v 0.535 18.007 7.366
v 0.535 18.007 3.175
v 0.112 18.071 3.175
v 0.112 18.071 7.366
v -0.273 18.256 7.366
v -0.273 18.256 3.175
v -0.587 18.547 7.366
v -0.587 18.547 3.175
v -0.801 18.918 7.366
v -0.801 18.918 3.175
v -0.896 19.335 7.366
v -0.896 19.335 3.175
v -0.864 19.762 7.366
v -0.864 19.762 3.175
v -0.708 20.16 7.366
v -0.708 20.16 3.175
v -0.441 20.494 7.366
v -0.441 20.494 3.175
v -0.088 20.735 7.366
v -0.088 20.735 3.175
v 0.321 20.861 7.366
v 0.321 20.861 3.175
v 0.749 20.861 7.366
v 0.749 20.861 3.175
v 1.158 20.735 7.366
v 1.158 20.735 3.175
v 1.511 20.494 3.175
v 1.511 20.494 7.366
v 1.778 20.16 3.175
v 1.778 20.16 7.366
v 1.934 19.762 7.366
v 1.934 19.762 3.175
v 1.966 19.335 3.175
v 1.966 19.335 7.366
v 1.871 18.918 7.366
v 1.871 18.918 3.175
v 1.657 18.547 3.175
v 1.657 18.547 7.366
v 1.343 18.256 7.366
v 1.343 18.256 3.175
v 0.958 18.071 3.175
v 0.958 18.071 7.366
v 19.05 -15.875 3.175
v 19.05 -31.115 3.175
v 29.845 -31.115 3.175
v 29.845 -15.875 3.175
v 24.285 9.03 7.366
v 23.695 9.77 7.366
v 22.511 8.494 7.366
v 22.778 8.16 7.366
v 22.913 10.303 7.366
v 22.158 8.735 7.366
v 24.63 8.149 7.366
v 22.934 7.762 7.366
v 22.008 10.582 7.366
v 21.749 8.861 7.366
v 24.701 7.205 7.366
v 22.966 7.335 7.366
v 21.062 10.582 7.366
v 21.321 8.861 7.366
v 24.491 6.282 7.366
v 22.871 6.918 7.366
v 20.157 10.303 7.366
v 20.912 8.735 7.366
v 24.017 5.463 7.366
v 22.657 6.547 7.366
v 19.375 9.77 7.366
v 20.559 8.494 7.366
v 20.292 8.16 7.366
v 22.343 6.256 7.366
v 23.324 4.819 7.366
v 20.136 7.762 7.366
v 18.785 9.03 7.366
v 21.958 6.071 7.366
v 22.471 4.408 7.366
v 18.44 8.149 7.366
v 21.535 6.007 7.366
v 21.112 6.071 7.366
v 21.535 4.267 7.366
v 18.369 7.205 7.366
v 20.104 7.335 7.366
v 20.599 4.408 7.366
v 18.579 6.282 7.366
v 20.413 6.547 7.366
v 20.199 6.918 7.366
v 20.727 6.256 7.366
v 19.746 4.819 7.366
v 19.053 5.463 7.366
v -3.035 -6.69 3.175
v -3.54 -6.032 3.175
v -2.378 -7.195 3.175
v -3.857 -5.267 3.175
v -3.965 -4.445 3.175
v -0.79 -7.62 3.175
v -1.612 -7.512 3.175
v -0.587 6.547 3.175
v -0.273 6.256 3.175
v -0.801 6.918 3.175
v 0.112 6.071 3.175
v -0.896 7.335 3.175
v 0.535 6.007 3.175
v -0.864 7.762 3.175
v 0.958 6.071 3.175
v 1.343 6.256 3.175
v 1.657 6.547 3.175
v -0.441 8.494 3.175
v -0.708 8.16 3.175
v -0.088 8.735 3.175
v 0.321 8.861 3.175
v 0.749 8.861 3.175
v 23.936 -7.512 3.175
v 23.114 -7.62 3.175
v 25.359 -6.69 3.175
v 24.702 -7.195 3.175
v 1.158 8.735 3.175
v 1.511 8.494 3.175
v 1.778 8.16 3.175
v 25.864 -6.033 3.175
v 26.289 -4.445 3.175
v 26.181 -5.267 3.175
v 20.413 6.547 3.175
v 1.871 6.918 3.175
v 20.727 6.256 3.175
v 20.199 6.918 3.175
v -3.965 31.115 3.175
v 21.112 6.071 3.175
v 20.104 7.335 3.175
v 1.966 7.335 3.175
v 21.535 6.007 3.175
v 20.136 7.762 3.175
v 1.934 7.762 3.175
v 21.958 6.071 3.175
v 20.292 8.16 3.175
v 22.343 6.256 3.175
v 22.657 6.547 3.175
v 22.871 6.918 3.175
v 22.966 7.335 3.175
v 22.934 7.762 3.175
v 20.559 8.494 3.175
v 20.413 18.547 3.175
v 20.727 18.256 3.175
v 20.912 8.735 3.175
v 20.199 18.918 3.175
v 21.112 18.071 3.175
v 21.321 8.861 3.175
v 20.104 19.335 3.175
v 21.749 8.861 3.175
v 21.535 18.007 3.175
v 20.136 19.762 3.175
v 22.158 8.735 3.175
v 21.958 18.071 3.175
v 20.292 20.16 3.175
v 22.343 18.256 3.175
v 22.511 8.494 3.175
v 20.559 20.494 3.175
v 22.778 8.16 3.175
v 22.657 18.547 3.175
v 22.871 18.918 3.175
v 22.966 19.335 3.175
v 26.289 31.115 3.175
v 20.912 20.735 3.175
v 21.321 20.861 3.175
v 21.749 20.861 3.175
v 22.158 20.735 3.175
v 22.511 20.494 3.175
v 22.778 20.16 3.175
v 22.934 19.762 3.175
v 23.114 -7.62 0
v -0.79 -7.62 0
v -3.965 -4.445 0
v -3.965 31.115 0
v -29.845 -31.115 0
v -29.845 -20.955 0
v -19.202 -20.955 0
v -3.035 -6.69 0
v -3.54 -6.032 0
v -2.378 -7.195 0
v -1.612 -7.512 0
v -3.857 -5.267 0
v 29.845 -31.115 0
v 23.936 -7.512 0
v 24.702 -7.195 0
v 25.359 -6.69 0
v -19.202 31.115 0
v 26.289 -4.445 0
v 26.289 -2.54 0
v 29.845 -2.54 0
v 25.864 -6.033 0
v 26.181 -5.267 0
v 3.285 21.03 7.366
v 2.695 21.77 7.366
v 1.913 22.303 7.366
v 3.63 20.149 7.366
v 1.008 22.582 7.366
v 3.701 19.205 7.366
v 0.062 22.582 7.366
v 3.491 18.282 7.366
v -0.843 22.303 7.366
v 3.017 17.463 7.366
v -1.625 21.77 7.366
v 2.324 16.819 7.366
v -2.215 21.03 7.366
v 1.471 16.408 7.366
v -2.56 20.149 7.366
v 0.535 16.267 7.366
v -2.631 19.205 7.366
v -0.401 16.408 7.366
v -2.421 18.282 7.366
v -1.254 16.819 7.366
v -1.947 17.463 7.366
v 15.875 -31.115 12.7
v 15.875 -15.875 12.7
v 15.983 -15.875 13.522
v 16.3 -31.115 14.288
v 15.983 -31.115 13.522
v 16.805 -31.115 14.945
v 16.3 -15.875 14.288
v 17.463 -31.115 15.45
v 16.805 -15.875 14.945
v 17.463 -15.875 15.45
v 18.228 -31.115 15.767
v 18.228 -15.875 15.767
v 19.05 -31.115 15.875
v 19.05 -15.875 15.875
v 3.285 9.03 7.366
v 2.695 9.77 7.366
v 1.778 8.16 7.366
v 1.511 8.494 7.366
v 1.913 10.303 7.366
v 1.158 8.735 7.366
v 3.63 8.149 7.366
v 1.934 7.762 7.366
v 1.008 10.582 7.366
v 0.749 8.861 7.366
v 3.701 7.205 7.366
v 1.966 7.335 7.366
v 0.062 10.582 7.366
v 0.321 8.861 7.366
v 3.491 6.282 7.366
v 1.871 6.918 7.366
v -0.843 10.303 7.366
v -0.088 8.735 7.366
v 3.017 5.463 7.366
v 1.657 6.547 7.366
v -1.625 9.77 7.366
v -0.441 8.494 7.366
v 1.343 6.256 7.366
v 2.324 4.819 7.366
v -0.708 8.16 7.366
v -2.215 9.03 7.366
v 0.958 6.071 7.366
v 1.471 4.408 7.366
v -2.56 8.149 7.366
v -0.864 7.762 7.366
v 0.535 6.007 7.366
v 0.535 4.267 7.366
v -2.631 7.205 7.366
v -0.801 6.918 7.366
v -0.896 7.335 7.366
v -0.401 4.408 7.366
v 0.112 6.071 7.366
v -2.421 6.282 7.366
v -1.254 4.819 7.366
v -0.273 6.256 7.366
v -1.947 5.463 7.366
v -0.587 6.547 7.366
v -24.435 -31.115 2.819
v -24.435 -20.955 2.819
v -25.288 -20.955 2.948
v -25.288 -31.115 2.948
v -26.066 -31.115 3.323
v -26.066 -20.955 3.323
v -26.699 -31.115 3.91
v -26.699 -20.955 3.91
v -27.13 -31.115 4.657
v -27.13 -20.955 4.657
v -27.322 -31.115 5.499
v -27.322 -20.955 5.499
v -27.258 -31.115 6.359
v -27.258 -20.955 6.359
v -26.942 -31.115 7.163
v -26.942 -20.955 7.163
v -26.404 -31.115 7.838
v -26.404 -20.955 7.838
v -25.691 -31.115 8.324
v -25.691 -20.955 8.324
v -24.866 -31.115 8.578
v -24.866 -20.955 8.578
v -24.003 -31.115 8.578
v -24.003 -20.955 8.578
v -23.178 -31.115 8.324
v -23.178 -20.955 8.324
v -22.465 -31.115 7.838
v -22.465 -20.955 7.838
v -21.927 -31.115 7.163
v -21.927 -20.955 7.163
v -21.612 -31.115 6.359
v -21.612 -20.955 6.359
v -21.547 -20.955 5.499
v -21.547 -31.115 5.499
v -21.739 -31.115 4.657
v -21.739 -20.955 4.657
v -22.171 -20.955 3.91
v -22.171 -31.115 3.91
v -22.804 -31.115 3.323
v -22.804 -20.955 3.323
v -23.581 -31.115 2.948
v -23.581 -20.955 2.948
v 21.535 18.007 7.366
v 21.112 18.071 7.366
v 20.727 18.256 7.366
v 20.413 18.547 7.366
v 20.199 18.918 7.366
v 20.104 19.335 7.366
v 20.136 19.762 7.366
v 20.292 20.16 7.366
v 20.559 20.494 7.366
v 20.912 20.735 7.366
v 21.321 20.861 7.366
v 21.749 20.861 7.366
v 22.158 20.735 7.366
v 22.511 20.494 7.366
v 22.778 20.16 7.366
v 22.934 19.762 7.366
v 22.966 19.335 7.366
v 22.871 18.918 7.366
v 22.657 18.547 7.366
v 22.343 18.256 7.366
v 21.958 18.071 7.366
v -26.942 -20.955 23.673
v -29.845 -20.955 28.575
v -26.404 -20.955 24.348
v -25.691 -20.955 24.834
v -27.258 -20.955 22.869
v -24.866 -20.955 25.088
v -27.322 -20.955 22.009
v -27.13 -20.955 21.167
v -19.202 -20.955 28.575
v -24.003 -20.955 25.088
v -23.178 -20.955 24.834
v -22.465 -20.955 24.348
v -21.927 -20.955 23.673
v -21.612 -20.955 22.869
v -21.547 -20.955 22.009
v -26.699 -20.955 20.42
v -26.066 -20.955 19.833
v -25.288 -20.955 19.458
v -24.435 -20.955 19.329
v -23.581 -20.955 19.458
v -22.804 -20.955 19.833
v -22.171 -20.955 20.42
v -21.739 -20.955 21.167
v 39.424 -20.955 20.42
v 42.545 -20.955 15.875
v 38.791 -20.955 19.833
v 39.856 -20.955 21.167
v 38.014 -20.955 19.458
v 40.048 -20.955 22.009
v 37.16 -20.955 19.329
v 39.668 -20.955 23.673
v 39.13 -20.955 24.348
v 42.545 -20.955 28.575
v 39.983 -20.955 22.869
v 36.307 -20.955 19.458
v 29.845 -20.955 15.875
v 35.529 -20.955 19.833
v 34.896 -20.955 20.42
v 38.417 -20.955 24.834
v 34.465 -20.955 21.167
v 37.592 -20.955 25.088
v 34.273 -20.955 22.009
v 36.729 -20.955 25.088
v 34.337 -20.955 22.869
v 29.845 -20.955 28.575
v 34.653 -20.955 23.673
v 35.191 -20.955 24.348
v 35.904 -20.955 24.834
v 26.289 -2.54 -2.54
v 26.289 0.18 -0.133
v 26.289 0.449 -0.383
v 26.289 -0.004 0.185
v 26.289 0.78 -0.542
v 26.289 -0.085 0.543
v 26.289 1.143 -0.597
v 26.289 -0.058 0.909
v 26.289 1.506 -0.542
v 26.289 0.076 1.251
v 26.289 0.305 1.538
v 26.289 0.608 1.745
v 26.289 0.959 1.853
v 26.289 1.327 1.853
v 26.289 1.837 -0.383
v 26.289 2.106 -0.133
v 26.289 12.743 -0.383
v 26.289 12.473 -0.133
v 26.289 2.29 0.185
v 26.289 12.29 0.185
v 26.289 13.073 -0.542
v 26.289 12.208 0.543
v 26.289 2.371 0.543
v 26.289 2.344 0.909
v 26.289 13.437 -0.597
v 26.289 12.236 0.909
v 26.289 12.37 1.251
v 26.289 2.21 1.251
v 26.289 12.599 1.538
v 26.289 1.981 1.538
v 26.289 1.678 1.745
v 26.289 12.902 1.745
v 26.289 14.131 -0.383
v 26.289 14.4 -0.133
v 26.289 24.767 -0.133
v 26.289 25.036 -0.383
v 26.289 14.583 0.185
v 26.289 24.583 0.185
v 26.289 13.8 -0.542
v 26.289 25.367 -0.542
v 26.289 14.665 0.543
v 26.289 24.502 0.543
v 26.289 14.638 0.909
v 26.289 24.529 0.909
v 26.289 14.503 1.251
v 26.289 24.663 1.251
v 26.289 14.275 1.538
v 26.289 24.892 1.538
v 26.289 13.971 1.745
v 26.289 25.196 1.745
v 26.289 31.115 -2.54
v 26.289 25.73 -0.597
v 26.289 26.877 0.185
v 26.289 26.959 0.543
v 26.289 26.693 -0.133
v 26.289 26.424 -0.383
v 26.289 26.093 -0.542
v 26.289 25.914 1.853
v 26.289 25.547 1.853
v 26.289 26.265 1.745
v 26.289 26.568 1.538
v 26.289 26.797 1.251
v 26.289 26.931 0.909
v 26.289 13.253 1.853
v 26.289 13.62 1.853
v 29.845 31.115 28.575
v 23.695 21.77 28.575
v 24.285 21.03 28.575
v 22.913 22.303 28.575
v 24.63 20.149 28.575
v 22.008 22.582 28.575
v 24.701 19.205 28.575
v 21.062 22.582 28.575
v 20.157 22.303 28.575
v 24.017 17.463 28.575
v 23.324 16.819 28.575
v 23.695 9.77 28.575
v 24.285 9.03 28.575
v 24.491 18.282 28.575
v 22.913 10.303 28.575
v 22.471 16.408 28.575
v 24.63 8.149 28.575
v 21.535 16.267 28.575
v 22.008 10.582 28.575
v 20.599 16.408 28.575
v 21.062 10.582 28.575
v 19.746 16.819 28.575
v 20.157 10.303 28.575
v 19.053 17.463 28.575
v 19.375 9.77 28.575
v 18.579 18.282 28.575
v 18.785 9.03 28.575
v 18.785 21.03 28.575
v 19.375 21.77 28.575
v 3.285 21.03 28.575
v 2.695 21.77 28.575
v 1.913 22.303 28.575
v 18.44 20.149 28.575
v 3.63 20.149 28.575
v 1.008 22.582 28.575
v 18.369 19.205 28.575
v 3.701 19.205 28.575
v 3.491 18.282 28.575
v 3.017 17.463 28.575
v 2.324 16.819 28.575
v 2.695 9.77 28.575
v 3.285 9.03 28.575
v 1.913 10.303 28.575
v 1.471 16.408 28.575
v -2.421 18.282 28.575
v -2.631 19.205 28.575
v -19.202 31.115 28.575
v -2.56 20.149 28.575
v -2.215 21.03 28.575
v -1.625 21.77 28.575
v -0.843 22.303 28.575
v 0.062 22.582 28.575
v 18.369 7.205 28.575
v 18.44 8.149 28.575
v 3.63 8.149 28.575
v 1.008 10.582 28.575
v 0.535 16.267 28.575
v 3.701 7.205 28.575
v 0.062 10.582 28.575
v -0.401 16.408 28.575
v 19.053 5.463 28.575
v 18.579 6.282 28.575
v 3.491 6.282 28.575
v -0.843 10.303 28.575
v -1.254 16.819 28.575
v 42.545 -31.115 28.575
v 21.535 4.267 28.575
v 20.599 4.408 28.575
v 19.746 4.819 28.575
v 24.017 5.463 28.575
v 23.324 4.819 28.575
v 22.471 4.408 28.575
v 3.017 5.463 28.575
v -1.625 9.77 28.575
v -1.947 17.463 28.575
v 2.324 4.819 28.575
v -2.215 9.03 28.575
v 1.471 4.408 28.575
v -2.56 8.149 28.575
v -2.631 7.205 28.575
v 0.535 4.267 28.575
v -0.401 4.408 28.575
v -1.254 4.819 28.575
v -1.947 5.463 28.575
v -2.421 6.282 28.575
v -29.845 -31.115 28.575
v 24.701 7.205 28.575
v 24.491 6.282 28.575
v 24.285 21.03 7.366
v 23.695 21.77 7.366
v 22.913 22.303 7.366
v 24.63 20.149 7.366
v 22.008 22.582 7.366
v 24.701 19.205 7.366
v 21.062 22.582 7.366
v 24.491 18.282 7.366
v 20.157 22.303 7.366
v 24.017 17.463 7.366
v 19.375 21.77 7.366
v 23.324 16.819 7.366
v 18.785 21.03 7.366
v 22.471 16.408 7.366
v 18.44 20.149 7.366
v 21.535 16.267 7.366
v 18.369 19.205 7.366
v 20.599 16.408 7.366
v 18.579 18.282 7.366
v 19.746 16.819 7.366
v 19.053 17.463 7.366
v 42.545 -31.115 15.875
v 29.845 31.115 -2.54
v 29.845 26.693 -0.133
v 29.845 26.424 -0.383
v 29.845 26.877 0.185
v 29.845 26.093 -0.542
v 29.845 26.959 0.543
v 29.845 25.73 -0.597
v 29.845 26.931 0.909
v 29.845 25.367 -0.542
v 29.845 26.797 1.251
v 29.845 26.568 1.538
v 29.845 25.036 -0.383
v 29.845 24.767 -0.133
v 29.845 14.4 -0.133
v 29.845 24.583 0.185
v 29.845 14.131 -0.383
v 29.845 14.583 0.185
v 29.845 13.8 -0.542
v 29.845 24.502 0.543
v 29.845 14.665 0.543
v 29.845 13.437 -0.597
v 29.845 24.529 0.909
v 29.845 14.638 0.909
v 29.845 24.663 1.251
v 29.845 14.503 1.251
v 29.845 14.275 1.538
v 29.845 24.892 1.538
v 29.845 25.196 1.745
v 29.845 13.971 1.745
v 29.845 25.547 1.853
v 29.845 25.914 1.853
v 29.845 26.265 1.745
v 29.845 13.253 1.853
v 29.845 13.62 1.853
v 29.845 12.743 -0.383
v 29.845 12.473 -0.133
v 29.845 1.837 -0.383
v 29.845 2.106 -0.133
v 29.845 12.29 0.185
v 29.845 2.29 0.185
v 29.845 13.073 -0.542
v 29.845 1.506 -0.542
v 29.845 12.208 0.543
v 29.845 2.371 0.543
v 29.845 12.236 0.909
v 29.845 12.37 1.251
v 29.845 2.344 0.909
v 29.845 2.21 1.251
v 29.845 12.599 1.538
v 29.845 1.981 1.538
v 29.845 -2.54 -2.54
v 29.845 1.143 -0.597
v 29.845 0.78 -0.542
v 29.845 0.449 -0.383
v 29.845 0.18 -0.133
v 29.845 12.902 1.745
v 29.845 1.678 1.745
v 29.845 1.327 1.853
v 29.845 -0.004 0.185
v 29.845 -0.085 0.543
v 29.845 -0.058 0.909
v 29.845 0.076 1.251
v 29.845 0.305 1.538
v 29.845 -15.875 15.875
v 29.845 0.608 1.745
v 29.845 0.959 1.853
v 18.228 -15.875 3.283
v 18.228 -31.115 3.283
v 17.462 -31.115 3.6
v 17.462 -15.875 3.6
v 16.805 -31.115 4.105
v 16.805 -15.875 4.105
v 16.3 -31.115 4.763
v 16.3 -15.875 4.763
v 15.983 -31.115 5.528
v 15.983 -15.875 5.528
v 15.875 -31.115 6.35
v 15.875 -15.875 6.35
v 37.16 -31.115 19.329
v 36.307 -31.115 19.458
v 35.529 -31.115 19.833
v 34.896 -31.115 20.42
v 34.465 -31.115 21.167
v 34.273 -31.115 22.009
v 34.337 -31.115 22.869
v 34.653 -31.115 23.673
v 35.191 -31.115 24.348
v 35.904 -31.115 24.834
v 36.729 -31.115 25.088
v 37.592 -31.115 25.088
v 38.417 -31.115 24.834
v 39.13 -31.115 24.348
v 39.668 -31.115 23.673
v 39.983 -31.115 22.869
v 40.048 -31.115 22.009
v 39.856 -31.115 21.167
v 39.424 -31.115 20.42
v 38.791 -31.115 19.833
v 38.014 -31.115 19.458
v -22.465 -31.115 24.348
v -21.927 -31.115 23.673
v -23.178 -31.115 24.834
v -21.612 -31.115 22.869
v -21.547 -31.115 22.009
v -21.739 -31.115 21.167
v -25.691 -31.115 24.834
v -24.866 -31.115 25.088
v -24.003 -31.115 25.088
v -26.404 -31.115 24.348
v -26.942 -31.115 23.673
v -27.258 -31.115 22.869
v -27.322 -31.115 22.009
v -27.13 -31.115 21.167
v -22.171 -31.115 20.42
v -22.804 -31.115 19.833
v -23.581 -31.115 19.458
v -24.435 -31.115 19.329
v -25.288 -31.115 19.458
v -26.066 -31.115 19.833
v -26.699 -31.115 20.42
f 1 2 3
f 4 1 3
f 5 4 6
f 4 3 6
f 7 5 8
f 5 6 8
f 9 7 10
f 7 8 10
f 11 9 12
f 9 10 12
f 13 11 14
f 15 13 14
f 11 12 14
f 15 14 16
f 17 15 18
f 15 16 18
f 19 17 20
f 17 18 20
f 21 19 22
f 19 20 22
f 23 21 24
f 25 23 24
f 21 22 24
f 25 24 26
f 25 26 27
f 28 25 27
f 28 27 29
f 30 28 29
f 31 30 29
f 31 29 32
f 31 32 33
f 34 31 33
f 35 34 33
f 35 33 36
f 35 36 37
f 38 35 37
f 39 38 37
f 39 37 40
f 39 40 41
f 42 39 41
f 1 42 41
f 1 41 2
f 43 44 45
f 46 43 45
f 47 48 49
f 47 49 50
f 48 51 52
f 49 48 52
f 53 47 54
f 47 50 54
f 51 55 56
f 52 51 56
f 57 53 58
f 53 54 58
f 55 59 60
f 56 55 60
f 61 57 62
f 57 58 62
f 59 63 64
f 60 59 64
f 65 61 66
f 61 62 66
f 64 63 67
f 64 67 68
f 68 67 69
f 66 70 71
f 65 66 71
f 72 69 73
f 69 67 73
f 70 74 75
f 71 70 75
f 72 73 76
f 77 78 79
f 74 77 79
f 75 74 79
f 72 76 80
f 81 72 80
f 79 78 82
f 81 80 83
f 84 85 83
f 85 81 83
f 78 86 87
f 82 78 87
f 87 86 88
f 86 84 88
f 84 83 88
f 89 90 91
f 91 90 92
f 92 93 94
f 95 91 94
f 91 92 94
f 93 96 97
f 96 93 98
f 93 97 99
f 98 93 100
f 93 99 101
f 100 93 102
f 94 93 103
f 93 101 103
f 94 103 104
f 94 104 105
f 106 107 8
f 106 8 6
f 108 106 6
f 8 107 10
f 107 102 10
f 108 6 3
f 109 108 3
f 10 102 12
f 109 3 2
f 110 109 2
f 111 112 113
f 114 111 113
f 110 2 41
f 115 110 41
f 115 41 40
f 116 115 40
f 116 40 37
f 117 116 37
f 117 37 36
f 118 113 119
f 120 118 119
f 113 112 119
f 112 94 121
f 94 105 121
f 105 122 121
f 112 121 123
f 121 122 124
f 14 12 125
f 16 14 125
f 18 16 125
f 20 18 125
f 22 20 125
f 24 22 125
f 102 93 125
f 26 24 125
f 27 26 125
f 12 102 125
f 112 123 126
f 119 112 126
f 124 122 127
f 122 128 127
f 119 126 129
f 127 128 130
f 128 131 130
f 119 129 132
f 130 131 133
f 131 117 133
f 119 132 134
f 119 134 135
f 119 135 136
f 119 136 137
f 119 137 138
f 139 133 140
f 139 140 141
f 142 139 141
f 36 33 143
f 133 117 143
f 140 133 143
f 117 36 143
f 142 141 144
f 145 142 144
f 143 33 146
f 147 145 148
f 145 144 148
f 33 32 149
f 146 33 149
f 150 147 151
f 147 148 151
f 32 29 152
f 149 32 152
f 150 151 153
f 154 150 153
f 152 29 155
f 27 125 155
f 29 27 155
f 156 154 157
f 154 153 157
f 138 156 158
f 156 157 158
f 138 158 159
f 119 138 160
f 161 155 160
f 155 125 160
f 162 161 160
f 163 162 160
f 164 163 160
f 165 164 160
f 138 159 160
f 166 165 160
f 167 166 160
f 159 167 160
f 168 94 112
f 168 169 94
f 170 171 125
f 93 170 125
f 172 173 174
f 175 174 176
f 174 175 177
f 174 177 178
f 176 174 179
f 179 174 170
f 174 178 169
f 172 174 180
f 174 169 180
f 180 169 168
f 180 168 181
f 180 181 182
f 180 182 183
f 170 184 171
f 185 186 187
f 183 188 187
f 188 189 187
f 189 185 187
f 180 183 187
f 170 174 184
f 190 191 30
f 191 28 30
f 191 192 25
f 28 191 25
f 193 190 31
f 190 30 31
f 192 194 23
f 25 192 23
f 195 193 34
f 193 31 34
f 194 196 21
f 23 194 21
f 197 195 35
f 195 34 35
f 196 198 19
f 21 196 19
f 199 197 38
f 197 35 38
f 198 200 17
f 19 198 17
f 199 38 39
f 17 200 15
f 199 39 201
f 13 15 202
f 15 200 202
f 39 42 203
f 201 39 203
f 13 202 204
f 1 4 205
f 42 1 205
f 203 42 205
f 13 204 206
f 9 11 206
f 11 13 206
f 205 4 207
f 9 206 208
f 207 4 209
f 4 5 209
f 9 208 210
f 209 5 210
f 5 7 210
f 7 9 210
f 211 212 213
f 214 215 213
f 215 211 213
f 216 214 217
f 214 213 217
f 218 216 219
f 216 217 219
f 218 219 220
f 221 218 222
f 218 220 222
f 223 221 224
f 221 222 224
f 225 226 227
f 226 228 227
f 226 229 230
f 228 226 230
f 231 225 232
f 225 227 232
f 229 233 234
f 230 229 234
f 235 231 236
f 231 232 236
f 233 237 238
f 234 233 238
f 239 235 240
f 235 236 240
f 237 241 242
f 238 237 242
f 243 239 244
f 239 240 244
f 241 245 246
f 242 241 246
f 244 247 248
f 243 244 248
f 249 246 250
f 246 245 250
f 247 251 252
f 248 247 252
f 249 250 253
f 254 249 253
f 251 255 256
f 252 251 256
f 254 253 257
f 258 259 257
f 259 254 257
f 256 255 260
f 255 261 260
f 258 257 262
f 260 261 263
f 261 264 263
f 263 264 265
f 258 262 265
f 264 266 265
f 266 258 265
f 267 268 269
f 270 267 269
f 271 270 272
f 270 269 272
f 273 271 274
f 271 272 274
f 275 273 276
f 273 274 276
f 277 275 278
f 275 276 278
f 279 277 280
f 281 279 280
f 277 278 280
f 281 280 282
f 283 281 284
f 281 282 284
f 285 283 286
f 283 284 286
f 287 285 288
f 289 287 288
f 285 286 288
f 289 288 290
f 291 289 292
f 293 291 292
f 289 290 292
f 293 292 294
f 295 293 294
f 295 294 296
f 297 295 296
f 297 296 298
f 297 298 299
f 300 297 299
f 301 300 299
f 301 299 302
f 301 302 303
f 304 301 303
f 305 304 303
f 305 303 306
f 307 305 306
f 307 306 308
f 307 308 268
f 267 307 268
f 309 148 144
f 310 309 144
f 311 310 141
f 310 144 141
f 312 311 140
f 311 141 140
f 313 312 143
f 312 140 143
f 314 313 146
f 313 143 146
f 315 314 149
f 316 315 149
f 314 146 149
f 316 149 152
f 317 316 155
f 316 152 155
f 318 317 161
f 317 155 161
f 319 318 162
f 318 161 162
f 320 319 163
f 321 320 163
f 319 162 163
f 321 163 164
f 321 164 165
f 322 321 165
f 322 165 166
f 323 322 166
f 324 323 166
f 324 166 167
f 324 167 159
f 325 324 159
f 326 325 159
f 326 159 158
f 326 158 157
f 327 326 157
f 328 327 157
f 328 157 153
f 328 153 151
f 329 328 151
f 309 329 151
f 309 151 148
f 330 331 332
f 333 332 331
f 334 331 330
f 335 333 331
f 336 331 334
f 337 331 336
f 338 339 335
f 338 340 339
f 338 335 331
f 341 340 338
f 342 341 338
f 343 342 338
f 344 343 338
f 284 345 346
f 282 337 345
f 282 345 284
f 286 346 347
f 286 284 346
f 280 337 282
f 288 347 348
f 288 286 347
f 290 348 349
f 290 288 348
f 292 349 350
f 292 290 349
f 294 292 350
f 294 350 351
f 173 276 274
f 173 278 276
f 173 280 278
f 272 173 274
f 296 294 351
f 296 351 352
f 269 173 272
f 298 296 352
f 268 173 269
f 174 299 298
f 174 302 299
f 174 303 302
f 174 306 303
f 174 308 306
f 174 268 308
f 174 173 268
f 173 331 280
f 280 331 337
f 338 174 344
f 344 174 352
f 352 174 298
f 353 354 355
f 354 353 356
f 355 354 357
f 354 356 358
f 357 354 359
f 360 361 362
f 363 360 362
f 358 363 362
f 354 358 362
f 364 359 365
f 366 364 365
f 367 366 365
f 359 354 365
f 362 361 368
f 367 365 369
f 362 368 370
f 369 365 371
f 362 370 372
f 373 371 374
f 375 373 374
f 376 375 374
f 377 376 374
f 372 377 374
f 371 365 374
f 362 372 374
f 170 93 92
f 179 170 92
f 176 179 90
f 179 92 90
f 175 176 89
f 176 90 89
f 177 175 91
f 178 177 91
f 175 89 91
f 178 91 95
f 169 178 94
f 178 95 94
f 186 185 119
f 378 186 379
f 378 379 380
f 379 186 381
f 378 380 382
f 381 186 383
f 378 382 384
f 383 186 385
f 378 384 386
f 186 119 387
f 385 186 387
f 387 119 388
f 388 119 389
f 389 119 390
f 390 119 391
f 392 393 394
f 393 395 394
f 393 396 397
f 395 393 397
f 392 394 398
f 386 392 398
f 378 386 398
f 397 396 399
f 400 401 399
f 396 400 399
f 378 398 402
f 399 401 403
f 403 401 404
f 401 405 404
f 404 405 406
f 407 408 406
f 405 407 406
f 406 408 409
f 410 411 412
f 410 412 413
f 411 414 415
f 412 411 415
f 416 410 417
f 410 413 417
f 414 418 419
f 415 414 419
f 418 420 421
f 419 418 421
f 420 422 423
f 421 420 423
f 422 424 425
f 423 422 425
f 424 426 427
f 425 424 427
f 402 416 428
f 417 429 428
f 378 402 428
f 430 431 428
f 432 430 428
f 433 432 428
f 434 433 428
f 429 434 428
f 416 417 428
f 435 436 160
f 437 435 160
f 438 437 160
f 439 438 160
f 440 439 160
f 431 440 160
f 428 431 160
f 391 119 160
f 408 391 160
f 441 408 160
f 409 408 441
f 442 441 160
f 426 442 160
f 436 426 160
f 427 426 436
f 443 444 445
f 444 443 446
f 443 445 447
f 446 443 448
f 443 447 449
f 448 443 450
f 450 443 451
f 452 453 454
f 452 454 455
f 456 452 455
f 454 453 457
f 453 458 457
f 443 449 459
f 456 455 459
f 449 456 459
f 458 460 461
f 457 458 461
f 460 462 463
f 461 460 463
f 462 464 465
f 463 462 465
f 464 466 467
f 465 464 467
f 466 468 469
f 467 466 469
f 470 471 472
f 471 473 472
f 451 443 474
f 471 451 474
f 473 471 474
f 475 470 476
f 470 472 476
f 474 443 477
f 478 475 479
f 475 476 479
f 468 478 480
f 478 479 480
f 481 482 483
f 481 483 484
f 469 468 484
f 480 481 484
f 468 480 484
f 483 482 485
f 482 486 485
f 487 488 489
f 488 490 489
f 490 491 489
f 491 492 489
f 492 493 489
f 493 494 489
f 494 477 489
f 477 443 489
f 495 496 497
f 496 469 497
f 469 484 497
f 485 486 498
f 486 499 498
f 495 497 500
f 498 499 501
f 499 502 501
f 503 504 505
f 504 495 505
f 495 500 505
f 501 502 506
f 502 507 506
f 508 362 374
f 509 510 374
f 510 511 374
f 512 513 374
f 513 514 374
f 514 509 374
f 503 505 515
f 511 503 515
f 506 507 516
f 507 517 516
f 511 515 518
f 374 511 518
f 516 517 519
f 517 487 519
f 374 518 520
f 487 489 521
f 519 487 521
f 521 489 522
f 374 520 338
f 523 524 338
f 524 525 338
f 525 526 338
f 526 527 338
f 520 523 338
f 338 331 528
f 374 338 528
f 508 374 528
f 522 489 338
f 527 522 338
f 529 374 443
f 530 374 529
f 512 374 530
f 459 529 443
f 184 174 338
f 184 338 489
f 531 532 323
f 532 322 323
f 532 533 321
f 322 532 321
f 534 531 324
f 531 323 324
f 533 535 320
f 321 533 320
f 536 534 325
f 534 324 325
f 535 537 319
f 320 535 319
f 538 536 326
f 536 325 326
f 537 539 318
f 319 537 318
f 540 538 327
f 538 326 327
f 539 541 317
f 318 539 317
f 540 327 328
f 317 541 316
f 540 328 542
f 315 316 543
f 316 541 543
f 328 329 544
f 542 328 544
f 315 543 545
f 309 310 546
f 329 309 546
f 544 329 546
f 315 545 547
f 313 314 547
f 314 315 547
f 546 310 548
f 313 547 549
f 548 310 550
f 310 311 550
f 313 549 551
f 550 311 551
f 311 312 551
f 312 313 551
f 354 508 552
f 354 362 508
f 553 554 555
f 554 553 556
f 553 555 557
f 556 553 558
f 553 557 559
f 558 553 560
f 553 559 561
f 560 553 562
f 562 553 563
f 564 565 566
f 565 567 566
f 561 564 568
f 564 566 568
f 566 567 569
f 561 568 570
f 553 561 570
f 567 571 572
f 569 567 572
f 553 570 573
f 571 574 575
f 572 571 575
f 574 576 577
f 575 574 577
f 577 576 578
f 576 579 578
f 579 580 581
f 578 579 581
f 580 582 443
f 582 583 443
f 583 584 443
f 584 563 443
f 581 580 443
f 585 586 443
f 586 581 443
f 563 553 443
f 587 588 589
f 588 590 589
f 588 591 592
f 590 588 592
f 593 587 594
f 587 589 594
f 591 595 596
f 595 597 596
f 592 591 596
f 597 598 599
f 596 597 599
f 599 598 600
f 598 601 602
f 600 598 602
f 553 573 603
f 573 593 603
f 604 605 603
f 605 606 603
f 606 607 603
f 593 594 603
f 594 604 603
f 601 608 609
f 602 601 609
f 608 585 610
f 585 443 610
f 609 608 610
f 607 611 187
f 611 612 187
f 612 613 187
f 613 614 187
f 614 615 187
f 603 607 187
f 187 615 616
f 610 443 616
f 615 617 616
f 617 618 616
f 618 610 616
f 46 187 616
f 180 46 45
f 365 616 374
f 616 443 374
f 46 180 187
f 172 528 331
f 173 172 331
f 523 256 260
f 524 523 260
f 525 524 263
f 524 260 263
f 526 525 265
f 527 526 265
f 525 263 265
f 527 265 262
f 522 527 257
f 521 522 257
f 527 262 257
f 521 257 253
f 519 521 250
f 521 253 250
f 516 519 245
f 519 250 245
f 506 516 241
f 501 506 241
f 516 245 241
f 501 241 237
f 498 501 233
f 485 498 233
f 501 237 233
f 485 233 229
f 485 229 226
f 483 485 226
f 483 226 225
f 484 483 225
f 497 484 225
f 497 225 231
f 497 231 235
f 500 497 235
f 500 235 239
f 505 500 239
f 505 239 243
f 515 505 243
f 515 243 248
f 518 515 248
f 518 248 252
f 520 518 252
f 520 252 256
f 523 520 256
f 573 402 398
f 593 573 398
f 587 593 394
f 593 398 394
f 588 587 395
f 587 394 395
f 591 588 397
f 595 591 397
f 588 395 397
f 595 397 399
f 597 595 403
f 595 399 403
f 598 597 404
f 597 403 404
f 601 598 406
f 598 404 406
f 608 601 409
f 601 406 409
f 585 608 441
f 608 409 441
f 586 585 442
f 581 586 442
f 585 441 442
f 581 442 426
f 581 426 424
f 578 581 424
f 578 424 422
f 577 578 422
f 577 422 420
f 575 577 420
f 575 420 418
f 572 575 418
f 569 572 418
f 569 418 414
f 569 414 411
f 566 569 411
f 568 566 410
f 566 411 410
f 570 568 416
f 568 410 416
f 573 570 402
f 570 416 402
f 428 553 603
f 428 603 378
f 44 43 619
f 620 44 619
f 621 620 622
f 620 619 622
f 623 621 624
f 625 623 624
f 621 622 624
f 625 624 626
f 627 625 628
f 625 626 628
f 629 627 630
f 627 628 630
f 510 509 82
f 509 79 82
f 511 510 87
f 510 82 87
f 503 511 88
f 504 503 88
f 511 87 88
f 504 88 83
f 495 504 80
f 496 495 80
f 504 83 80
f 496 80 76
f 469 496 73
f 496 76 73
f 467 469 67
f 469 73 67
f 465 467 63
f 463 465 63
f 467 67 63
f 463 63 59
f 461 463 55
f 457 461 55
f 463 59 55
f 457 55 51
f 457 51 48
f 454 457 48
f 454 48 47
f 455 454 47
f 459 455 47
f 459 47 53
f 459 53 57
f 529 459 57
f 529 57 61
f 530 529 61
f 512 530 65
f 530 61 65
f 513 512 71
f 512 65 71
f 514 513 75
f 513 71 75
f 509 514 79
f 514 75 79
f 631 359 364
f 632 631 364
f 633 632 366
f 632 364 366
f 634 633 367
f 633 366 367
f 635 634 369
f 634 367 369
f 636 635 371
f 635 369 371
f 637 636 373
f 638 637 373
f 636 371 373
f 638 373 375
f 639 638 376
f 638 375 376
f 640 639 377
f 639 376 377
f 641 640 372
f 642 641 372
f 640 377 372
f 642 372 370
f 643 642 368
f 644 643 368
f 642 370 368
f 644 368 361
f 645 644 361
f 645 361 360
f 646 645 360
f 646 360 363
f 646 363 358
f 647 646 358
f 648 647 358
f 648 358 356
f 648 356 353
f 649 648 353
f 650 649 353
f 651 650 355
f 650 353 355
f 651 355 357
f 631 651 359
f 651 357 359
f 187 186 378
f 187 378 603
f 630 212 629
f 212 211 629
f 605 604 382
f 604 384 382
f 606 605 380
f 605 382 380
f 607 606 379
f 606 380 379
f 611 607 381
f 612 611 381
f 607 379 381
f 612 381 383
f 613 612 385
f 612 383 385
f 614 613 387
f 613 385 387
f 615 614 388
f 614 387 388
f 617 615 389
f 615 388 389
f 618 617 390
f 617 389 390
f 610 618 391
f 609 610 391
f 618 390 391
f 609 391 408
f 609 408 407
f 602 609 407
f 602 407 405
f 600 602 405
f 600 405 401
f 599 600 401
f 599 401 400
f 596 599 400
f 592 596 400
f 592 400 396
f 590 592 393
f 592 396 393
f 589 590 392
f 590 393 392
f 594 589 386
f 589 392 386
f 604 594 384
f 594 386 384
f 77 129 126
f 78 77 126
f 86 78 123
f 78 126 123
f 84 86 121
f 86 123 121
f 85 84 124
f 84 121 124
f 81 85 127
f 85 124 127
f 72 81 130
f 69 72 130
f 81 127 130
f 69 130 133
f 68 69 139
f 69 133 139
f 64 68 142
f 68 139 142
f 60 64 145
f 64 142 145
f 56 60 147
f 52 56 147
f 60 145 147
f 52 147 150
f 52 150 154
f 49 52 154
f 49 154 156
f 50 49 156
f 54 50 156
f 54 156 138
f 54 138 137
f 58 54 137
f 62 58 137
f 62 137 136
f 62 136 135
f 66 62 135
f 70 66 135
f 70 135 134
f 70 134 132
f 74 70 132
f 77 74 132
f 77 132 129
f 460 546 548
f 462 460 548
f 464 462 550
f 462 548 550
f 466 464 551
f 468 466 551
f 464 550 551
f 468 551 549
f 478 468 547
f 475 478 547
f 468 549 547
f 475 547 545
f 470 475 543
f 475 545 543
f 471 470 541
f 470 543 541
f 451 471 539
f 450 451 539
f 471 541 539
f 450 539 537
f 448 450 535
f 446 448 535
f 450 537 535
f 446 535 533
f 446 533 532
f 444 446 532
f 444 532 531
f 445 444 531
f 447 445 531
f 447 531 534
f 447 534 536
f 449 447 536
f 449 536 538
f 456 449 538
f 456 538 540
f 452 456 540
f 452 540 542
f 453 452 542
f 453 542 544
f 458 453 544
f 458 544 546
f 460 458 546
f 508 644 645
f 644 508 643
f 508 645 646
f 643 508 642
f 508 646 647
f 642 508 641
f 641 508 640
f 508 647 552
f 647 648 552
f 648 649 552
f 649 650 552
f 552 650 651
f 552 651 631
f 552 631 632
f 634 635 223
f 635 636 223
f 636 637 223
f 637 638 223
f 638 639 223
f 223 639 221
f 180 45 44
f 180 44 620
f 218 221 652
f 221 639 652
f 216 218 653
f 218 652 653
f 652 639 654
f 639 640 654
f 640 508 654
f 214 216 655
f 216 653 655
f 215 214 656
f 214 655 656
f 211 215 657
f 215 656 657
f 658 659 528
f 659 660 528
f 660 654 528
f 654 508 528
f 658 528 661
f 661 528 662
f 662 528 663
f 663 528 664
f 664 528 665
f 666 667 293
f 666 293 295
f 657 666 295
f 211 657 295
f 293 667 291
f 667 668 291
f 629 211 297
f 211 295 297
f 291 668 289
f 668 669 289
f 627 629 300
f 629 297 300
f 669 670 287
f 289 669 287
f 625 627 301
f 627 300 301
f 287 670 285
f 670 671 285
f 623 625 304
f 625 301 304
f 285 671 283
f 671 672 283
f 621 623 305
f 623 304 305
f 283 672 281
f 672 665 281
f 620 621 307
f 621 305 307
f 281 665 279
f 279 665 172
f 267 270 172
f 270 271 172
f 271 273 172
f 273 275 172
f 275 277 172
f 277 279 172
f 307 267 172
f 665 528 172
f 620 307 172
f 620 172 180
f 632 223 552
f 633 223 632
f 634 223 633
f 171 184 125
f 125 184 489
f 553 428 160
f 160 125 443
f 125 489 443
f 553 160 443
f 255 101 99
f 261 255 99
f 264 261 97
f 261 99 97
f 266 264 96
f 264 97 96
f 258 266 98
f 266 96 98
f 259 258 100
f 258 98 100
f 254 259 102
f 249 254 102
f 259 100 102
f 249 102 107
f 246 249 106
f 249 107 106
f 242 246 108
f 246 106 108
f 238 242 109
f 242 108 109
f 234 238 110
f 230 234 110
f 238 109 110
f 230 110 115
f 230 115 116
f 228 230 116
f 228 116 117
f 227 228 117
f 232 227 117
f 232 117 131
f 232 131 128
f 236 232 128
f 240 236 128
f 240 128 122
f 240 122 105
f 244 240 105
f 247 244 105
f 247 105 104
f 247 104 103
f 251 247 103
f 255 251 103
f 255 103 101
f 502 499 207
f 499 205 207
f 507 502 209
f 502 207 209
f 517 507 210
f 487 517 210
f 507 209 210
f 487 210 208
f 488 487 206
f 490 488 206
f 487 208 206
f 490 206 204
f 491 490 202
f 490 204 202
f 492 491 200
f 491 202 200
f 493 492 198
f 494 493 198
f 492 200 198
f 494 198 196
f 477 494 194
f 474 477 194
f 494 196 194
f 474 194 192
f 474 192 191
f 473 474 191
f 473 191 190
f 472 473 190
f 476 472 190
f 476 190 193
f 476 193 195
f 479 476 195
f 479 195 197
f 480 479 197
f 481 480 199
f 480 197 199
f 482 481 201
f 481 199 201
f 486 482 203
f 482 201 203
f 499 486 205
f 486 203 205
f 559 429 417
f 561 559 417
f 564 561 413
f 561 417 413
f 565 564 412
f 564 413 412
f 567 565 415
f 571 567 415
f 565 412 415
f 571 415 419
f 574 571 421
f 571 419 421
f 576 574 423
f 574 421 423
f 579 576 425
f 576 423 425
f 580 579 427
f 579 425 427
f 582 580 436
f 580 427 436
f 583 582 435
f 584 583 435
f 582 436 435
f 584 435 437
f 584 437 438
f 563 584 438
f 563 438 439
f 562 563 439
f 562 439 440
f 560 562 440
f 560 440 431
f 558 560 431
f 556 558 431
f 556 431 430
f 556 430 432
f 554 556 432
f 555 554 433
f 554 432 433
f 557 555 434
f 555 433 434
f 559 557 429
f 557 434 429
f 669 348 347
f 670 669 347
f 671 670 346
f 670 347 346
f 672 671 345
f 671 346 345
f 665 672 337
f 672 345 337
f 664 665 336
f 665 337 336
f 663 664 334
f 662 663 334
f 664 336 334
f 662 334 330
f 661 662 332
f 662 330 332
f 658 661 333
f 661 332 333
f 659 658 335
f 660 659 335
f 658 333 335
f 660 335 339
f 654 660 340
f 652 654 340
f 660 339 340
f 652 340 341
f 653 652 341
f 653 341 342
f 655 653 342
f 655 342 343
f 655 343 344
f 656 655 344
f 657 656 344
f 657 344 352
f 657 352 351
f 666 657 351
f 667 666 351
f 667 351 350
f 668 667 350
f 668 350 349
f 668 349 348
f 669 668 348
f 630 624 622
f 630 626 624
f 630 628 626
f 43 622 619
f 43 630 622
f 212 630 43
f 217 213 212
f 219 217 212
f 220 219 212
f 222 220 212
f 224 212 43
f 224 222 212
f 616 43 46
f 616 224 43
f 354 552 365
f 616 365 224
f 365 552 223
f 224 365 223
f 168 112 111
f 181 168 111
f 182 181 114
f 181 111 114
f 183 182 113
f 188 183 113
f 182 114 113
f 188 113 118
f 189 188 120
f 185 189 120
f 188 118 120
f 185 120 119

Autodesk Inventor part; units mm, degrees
ref_plane "XZ Plane" through (0, 0, 0) normal (0, 1, 0) x (-1, 0, 0)
ref_plane "XY Plane" through (0, 0, 0) normal (0, 0, 1) x (1, 0, 0)
sketch "Sketch1" plane through (0, 0, 0) normal (0, 0, 1) x (1, 0, 0)
  line L0 (29.845, -31.115) -> (-29.845, -31.115)
  line L1 (-29.845, -31.115) -> (-29.845, 31.115)
  line L2 (-29.845, 31.115) -> (29.845, 31.115)
  line L3 (29.845, 31.115) -> (29.845, -31.115)
  line L4 (29.845, -31.115) -> (-29.845, 31.115) construction
  line L5 (-29.845, -31.115) -> (29.845, 31.115) construction
  point P0 (0, 0)
  dimension "d0" = 59.69
  dimension "d1" = 62.23
extrude "Extrusion1" add sketch "Sketch1" along normal blind 28.575
sketch "Sketch2" plane through (-29.845, 31.115, 0) normal (0, 1, 0) x (1, 0, 0)
  line L0 (0, 0) -> (59.69, 0) projected
  line L1 (59.69, 0) -> (59.69, -28.575) projected
  line L2 (56.134, 0) -> (25.88, 0)
  line L3 (25.88, 0) -> (25.88, -3.175)
  line L4 (25.88, -3.175) -> (56.134, -3.175)
  line L5 (59.69, 0) -> (0, 0) projected
  line L6 (56.134, 0) -> (56.134, -3.175)
  point P0 (29.845, 0)
  dimension "d4" = 3.175
  dimension "d5" = 30.254
  dimension "d52" = 3.556
extrude "Extrusion2" cut sketch "Sketch2" against normal blind 38.735
sketch "Sketch3" plane through (0, 0, 0) normal (0, 0, 1) x (1, 0, 0)
  point P0 (0, 0)
sketch "Sketch4" plane through (0, 0, 28.575) normal (0, 0, 1) x (1, 0, 0)
  line L0 (0.535, 7.4422) -> (21.535, 7.4422) construction
  line L1 (21.535, 7.4422) -> (21.535, 19.4422) construction
  line L2 (21.535, 19.4422) -> (0.535, 19.4422) construction
  line L3 (0.535, 19.4422) -> (0.535, 7.4422) construction
  line L4 (-29.845, -31.115) -> (29.845, -31.115) projected
  line L5 (-3.965, 31.115) -> (-3.965, -7.62) projected
  point P0 (0, 0)
  dimension "d8" = 21
  dimension "d9" = 12
  dimension "d10" = 38.5572
  dimension "d11" = 4.5
hole "Hole1" at (0.535, 19.4422, 28.575) at (0.535, 7.4422, 28.575) at (21.535, 7.4422, 28.575) at (21.535, 19.4422, 28.575) direction (0, 0, -1) diameter 2.8702 end through all counterbore diameter 6.35 counterbore depth 21.209
fillet "Fillet1" radius 3.175 2 edges at (-3.965, -7.62, 1.5875) (26.289, -7.62, 1.5875)
sketch "Sketch5" plane through (29.845, -31.115, 28.575) normal (1, 0, 0) x (0, 0, -1)
  line L0 (0, 0) -> (12.7, 0)
  line L1 (12.7, 0) -> (12.7, 10.16)
  line L2 (12.7, 10.16) -> (0, 10.16)
  line L3 (0, 10.16) -> (0, 0)
  point P0 (28.575, 31.115)
  dimension "d20" = 12.7
  dimension "d21" = 10.16
extrude "Extrusion3" add sketch "Sketch5" along normal blind 12.7
sketch "Sketch6" plane through (-29.845, -31.115, 0) normal (0, -1, 0) x (1, 0, 0)
  line L0 (29.845, 34.29) -> (29.845, -5.715) projected
  line L1 (0, 28.575) -> (72.39, 28.575) projected
  line L2 (72.39, 28.575) -> (72.39, 15.875) projected
  line L3 (0, 0) -> (0, 28.575) projected
  point P0 (67.0052, 22.225)
  point P1 (5.4102, 22.225)
  point P2 (5.4102, 5.715)
  dimension "d39" = 6.35
  dimension "d40" = 37.1602
  dimension "d41" = 16.51
  dimension "d42" = 61.595
  dimension "d67" = 5.3848
  dimension "d68" = 5.4102
hole "Hole2" at (37.1602, -31.115, 22.225) at (-24.4348, -31.115, 22.225) at (-24.4348, -31.115, 5.715) direction (0, 1, 0) diameter 5.7912 depth 12.7 tip angle 118
sketch "Sketch7" plane through (0, 0, 0) normal (0, 0, 1) x (1, 0, 0)
  line L0 (29.845, -20.955) -> (42.545, -20.955) projected
  line L1 (-29.845, 31.115) -> (-29.845, -31.115) projected
  line L2 (-29.845, -31.115) -> (42.545, -31.115) projected
  line L3 (29.845, 31.115) -> (-29.845, 31.115) projected
  line L4 (-29.845, -20.955) -> (-19.2024, -20.955)
  line L5 (-19.2024, -20.955) -> (-19.2024, 31.115)
  line L6 (-19.2024, 31.115) -> (-29.845, 31.115)
  line L7 (-29.845, 31.115) -> (-29.845, -20.955)
  point P0 (0, 0)
  dimension "d35" = 10.6426
  dimension "d36" = 10.16
  dimension "d43" = 0
extrude "Extrusion4" cut sketch "Sketch7" along normal up to next
sketch "Sketch8" plane through (-29.845, -20.955, 28.575) normal (0, 1, 0) x (1, 0, 0)
  circle A0 centre (5.4102, 22.86) radius 2.8956 projected
  point P0 (29.845, 28.575)
sketch "Sketch9" plane through (-29.845, -31.115, 0) normal (0, -1, 0) x (1, 0, 0)
  line L0 (59.69, 15.875) -> (72.39, 15.875) projected
  line L1 (59.69, 0) -> (59.69, 15.875) projected
  line L2 (59.69, 0) -> (59.69, 28.575) construction
  line L3 (59.69, 15.875) -> (45.72, 15.875)
  line L4 (45.72, 15.875) -> (45.72, 3.175)
  line L5 (45.72, 3.175) -> (59.69, 3.175)
  line L6 (59.69, 3.175) -> (59.69, 15.875)
  line L7 (59.69, 0) -> (0, 0) construction
  point P0 (29.845, 0)
  point P1 (59.69, 3.175)
  dimension "d44" = 13.97
  dimension "d46" = 0
  dimension "d48" = 3.175
extrude "Extrusion5" cut sketch "Sketch9" against normal blind 15.24
fillet "Fillet2" radius 3.175 2 edges at (15.875, -23.495, 3.175) (15.875, -23.495, 15.875)
sketch "Sketch10" plane through (0, 0, 0) normal (0, 0, -1) x (-1, 0, 0)
  line L0 (-29.845, 31.115) -> (-29.845, -31.115) projected
  line L1 (-26.289, 31.115) -> (-29.845, 31.115) projected
  line L2 (-26.289, -4.445) -> (-26.289, 31.115) projected
  line L3 (-29.845, 31.115) -> (-26.289, 31.115)
  line L4 (-26.289, 31.115) -> (-26.289, -2.54)
  line L5 (-26.289, -2.54) -> (-29.845, -2.54)
  line L6 (-29.845, -2.54) -> (-29.845, 31.115)
  point P0 (0, 0)
  dimension "d53" = 33.655
extrude "Extrusion6" add sketch "Sketch10" along normal blind 2.54
sketch "Sketch11" plane through (29.845, -20.955, 28.575) normal (1, 0, 0) x (0, 0, -1)
  line L0 (0, 52.07) -> (31.115, 52.07) projected
  line L1 (31.115, 52.07) -> (31.115, 18.415) projected
  point P0 (28.575, 20.955)
  point P1 (27.94, 46.6852)
  point P2 (27.94, 22.098)
  point P3 (27.94, 34.3916)
  dimension "d56" = 3.175
  dimension "d57" = 5.3848
  dimension "d58" = 24.5872
  dimension "d66" = 12.2936
hole "Hole3" at (29.845, 25.7302, 0.635) at (29.845, 1.143, 0.635) at (29.845, 13.4366, 0.635) direction (-1, 0, 0) diameter 2.4638 end up to surface
equation "\"d66\" = 0.5 * d58"
properties part number "J005333" material "ALUMINUM, 6061-T651"
